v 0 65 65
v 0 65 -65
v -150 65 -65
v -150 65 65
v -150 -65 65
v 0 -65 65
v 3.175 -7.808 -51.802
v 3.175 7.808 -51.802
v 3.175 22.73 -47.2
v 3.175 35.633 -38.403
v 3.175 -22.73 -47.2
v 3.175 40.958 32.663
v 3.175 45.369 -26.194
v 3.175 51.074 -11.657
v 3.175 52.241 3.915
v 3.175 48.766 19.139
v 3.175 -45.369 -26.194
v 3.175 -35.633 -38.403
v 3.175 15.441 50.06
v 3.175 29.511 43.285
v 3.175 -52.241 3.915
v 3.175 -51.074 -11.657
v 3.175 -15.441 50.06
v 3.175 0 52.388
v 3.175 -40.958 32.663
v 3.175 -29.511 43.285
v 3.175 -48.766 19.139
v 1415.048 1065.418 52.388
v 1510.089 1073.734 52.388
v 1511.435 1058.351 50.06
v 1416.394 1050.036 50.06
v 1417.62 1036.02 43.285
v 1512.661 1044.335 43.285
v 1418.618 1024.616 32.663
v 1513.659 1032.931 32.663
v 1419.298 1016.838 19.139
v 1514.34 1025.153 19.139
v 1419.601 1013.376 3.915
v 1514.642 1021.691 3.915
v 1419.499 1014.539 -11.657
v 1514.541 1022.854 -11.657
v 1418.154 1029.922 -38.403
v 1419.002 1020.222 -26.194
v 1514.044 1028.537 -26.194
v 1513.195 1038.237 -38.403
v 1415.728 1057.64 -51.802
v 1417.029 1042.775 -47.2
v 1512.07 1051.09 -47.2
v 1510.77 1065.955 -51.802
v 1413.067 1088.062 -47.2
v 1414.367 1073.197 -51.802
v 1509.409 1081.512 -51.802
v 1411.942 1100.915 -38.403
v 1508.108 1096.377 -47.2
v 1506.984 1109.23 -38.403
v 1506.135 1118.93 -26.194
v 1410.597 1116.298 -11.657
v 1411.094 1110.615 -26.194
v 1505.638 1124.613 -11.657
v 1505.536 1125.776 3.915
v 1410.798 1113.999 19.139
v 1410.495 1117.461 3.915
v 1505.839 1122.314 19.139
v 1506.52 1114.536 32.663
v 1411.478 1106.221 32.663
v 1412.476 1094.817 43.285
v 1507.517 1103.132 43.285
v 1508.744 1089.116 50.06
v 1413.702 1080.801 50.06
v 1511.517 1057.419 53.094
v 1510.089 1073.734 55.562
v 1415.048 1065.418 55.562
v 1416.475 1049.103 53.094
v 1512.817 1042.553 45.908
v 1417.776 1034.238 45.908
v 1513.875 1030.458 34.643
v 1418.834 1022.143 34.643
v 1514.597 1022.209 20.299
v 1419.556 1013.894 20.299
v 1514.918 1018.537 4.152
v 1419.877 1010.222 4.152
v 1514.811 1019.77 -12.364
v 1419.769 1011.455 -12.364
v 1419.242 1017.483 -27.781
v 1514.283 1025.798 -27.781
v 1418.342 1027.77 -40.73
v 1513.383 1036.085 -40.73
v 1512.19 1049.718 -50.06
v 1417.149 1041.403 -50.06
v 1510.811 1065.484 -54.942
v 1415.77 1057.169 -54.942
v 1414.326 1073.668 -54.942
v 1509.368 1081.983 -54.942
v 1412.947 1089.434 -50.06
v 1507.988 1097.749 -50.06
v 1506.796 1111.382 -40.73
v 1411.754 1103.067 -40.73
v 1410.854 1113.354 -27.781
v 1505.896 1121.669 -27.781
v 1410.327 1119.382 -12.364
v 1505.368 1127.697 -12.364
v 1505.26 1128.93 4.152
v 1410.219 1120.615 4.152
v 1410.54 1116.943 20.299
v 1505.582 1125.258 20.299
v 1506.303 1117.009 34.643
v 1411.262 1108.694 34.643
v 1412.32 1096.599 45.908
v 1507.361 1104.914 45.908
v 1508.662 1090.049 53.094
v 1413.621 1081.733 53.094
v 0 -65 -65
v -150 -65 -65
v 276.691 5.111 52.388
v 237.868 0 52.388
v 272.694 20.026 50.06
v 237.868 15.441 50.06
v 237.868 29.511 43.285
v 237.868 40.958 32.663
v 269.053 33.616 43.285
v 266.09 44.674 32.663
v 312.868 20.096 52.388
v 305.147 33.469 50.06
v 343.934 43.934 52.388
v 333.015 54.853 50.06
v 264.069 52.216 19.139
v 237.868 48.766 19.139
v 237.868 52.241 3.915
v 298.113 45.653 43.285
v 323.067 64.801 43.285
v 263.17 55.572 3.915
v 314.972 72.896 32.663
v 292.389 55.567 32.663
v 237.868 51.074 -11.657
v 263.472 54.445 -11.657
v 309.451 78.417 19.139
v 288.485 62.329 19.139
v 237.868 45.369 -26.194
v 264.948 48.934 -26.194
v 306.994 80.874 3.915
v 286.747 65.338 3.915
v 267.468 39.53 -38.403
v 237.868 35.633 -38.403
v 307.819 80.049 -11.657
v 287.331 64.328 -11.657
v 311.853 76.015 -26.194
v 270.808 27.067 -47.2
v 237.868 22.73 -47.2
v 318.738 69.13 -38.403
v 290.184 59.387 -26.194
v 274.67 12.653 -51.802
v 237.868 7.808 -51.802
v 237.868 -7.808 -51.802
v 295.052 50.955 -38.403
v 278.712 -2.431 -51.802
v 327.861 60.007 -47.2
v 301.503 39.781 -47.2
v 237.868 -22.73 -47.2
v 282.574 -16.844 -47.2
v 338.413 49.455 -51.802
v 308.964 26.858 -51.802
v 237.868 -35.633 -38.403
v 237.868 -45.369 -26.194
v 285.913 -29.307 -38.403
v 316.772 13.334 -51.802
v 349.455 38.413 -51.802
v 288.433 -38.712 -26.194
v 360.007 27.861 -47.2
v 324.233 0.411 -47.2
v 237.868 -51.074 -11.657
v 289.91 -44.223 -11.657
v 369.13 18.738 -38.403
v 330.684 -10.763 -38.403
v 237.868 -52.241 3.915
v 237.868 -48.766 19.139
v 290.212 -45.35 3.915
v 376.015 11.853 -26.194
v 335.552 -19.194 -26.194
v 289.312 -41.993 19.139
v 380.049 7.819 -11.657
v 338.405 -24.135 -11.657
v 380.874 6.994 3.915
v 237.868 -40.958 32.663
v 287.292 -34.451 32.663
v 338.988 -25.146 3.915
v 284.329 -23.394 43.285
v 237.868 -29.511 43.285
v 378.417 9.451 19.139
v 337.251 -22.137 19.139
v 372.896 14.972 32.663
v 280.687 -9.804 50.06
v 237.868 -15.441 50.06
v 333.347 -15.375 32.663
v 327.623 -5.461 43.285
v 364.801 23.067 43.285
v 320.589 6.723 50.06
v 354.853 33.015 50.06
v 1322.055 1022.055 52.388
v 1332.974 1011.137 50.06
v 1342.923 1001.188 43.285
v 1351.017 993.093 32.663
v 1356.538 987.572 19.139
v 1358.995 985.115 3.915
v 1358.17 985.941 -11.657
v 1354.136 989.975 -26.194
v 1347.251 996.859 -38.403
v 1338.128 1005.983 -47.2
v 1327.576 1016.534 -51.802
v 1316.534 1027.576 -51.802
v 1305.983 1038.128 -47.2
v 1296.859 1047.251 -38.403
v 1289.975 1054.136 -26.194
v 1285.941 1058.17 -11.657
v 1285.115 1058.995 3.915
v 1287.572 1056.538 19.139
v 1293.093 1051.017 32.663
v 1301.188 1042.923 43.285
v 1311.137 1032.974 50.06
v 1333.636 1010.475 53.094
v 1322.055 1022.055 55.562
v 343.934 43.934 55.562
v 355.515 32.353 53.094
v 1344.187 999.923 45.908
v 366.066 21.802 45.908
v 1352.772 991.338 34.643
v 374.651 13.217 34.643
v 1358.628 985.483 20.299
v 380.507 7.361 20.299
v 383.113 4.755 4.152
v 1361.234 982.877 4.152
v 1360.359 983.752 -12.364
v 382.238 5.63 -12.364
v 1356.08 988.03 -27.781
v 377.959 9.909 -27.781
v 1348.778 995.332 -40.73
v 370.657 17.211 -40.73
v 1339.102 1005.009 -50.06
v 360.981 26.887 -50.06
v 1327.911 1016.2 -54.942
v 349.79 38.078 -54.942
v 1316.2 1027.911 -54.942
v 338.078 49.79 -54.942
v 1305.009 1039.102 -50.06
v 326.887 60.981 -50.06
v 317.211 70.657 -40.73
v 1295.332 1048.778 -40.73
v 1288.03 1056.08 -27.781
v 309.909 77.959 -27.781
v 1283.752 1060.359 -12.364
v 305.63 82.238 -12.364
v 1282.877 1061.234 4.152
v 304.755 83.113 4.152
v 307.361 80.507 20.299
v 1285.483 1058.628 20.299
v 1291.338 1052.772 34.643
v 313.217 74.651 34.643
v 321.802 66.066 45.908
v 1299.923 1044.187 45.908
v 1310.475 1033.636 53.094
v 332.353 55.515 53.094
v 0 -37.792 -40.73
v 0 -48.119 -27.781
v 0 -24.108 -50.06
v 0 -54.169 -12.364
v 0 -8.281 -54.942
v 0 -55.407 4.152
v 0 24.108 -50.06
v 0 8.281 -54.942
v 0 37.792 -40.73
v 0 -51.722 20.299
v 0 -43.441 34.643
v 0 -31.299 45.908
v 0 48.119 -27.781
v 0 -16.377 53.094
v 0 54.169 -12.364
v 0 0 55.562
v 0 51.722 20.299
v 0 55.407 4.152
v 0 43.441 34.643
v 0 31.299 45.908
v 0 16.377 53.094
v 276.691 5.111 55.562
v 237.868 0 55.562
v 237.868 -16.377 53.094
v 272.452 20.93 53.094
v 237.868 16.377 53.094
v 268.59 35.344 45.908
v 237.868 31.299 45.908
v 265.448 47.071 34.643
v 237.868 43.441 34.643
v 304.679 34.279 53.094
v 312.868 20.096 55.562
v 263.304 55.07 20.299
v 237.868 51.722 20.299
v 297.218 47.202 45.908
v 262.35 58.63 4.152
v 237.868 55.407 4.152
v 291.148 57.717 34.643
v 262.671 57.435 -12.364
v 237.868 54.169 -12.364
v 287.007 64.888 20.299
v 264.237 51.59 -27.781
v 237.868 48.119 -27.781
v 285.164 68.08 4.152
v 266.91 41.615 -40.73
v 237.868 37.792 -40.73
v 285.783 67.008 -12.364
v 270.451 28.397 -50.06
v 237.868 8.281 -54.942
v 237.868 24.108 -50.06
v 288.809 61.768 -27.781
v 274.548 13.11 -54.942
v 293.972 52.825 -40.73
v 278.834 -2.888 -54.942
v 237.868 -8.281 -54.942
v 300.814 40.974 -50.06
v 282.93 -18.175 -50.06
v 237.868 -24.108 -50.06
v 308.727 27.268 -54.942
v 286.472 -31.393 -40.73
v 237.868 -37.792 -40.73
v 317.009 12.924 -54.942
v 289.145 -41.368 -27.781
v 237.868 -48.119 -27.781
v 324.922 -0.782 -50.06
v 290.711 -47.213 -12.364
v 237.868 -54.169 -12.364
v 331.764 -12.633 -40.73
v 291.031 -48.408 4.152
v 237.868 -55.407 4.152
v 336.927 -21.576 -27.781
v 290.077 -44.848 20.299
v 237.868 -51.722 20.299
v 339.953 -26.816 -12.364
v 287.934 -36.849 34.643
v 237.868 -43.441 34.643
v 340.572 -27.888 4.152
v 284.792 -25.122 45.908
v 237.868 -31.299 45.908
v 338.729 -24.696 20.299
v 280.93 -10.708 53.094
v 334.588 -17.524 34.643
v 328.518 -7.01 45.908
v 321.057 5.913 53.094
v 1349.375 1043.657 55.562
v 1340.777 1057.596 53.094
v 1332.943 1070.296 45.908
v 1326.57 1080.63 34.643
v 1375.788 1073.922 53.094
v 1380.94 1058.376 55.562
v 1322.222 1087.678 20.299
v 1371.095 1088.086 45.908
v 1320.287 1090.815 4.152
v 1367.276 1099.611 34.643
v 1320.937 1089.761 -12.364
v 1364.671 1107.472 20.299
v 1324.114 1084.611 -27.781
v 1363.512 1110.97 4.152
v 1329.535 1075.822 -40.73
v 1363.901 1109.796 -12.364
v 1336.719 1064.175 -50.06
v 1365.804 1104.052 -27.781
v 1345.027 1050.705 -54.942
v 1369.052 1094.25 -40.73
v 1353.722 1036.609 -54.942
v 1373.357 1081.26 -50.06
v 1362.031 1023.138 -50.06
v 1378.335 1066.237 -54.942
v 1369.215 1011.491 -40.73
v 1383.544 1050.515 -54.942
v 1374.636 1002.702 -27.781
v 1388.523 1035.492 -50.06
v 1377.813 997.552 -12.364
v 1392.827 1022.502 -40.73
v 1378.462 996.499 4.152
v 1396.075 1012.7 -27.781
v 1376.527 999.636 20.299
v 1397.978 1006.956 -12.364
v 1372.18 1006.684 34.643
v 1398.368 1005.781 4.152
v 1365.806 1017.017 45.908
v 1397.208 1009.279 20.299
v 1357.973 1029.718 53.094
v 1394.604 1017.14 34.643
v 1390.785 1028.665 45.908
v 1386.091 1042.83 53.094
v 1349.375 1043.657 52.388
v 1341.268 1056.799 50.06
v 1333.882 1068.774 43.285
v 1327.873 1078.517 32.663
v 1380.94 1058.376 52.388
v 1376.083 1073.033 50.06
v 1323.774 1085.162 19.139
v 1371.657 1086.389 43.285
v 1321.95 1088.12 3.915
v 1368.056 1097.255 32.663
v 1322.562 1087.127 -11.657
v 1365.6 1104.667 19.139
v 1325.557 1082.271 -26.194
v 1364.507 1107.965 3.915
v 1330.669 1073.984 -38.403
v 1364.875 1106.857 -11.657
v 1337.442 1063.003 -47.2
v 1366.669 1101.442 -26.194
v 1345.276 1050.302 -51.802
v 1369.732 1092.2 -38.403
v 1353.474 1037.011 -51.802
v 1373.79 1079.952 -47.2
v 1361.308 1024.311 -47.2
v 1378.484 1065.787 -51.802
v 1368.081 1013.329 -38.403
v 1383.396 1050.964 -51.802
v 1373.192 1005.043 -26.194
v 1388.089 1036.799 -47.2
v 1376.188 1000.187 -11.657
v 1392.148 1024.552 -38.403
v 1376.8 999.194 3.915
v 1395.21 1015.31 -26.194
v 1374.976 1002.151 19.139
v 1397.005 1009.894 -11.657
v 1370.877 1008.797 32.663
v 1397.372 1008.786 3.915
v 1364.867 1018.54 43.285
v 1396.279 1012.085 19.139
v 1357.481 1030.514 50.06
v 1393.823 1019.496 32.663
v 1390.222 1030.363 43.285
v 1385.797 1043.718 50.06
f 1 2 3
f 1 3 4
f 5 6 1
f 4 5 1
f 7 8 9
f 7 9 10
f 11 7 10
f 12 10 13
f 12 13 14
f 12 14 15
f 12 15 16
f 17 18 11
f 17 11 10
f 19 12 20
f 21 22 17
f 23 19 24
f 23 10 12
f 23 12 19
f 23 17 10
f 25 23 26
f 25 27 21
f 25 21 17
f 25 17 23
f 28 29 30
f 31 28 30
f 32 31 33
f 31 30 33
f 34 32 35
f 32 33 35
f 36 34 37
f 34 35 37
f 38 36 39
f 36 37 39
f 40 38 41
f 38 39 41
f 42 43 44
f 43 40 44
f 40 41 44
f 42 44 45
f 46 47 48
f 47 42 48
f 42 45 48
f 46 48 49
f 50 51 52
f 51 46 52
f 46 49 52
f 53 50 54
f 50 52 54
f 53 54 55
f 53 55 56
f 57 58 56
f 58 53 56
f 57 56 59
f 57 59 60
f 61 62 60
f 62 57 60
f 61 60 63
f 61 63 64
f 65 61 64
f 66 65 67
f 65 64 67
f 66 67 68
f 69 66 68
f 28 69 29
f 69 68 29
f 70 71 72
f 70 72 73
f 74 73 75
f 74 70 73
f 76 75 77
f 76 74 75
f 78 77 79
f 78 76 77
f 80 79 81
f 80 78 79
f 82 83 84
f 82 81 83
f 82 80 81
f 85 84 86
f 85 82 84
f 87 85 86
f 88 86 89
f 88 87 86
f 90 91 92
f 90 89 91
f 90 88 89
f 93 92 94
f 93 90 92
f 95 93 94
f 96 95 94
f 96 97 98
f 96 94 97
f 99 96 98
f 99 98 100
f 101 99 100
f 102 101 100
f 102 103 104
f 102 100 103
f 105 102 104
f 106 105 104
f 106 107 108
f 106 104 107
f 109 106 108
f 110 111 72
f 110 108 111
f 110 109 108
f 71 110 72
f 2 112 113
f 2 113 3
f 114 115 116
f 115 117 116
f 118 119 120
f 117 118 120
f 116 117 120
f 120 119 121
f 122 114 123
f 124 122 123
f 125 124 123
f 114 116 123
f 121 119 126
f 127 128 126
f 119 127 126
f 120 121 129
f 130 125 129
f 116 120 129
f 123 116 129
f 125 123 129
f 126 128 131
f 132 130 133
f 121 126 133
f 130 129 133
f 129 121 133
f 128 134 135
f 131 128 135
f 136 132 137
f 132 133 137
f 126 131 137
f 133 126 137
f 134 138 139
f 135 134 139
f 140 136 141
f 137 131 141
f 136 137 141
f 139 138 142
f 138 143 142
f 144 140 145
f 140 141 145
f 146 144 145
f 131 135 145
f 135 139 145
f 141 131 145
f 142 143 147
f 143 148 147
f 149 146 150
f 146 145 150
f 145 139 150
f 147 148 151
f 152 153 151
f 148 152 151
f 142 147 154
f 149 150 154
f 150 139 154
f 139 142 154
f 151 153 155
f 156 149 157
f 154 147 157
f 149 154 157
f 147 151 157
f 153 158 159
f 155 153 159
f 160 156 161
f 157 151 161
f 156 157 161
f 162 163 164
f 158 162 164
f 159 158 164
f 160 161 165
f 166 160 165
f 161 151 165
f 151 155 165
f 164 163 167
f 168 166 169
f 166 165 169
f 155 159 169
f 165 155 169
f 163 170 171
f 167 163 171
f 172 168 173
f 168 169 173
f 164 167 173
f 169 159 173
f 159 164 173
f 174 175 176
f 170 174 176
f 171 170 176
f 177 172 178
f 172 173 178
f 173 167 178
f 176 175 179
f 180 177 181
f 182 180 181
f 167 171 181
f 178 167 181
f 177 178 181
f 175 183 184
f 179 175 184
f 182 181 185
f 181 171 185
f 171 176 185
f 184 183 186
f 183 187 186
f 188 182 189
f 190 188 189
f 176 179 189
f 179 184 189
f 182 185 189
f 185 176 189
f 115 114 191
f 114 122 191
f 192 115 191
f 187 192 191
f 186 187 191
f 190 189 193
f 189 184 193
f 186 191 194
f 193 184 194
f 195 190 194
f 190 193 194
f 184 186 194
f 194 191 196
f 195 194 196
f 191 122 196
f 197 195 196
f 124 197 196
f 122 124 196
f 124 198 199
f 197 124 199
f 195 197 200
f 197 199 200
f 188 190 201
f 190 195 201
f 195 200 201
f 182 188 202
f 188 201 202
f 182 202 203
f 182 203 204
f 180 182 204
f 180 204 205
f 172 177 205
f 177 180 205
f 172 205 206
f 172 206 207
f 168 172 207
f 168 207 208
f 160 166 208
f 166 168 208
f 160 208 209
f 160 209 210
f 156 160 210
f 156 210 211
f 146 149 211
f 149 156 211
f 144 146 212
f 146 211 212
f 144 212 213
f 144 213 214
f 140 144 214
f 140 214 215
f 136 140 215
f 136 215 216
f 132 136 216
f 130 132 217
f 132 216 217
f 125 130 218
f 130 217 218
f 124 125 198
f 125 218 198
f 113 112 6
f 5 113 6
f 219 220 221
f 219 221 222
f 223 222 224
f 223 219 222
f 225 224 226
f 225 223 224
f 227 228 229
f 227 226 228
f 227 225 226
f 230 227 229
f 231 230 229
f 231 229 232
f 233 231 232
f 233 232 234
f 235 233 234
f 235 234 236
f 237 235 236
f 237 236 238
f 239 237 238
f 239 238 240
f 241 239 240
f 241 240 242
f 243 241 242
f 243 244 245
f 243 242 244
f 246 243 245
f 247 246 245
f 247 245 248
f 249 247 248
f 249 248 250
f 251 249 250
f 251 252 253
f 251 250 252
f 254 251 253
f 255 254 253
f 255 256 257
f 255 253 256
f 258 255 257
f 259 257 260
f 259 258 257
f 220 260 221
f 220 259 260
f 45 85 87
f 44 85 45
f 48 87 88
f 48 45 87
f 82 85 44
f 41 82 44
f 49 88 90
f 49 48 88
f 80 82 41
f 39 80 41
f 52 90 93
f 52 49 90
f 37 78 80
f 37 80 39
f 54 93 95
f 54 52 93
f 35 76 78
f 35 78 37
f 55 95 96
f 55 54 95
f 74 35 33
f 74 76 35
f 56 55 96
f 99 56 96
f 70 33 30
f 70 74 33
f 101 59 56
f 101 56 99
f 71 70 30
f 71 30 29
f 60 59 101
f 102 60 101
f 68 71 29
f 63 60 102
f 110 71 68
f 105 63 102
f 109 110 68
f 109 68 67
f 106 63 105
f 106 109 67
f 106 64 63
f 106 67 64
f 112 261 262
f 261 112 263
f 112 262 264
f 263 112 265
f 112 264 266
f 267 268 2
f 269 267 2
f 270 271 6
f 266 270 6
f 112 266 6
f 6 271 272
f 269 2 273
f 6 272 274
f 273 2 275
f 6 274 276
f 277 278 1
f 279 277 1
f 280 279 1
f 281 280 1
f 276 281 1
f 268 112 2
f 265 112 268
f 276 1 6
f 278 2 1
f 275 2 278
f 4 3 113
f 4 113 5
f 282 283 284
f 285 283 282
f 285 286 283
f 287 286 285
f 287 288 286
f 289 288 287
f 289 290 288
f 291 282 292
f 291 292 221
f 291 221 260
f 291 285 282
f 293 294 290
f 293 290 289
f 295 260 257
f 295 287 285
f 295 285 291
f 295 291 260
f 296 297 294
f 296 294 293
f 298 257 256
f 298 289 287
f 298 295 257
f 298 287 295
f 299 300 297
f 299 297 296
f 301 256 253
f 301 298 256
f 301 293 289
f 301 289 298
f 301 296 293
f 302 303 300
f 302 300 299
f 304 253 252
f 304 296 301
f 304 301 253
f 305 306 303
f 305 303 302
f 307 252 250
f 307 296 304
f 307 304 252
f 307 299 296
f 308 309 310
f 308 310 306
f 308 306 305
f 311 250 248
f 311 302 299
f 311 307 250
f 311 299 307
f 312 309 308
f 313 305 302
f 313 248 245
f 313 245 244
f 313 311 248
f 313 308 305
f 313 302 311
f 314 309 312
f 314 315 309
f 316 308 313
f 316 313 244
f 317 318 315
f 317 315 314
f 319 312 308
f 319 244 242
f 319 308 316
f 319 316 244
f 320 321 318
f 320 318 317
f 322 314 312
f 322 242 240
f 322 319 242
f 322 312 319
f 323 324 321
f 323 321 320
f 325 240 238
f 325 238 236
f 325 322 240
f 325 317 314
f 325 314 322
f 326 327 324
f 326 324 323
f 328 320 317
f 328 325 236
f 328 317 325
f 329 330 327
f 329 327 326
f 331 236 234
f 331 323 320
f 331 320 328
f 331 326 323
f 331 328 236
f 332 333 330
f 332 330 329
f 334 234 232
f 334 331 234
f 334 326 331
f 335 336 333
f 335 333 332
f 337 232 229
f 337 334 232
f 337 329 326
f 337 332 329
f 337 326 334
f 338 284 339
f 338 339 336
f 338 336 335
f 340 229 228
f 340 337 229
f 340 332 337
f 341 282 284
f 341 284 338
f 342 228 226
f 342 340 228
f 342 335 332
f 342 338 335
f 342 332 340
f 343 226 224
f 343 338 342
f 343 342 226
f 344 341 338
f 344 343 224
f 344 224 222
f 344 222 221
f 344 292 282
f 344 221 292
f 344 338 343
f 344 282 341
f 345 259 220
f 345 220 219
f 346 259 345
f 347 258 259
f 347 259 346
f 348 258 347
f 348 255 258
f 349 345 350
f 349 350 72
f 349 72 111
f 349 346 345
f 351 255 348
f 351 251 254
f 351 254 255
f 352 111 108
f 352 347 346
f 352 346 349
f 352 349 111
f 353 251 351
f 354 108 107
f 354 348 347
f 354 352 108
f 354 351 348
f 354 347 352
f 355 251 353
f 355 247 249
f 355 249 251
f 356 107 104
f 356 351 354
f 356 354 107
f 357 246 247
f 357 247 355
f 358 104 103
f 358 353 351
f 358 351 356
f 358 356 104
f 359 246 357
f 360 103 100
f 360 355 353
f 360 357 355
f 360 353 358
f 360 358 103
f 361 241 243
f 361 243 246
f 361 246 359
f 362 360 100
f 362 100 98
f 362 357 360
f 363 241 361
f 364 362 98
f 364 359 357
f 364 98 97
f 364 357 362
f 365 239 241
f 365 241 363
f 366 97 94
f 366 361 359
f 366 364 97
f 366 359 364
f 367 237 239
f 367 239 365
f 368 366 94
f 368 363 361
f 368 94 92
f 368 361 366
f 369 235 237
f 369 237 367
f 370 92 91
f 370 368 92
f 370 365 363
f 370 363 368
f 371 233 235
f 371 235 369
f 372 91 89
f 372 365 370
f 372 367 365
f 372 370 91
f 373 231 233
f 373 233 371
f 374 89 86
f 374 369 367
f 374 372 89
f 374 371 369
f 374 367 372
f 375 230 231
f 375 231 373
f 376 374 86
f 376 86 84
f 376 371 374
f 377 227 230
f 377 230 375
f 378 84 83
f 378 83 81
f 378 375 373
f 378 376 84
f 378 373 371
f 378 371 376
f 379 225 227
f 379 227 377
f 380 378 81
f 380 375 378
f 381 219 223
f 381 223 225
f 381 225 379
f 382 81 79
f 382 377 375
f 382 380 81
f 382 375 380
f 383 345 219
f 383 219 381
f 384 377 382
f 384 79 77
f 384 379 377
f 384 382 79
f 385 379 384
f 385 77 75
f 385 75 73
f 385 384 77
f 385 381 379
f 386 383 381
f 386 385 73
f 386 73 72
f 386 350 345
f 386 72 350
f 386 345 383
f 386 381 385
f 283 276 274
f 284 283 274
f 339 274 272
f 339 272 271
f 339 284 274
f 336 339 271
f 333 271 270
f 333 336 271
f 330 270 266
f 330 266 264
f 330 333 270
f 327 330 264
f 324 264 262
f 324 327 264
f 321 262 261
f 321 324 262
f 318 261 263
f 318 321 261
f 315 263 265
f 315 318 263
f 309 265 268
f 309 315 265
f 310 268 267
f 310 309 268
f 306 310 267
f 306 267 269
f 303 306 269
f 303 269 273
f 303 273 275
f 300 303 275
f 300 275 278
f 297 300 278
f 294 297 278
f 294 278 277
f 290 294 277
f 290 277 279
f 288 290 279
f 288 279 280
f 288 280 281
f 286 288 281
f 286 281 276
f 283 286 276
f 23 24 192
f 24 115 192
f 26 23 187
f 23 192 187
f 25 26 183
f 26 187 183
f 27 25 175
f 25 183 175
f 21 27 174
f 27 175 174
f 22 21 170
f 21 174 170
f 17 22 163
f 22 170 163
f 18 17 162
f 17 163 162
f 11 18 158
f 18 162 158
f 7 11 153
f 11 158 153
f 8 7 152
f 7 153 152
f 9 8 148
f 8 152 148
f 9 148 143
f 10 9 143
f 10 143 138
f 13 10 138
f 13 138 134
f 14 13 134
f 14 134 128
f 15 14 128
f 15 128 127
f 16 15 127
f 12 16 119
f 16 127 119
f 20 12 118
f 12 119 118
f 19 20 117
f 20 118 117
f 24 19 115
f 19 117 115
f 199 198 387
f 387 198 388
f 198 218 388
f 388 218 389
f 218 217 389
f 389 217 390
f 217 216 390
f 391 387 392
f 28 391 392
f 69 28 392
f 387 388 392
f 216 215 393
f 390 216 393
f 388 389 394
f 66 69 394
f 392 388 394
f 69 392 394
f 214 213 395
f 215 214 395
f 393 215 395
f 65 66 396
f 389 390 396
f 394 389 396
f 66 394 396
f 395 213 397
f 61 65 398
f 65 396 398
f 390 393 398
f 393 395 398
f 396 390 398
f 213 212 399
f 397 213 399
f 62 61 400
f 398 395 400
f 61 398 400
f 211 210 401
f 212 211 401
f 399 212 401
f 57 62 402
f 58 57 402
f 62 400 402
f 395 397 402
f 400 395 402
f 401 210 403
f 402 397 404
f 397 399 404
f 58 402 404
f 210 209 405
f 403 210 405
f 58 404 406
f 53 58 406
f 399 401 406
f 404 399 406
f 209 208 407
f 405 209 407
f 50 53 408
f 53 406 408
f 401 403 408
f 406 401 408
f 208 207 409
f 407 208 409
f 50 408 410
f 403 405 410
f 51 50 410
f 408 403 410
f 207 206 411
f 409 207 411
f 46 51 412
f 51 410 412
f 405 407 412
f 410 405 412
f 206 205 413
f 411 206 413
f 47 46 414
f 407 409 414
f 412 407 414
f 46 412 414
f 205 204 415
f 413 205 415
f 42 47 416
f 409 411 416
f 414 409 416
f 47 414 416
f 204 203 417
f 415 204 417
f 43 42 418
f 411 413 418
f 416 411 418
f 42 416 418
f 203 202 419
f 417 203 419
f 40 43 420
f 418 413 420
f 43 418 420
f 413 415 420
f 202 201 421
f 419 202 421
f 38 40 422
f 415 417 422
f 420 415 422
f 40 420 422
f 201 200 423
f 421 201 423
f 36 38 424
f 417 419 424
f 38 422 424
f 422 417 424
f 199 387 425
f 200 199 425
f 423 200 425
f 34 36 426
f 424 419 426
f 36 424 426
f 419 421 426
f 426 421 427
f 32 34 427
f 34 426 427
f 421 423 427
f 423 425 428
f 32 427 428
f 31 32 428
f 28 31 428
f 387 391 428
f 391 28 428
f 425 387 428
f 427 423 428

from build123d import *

# Parameters (mm, degrees)
BARRER2_PROFILE_R       = 55.5625
VACIADO1_T              = -3.175
CROQUIS2_W              = 130
CROQUIS2_H              = 130
SALIENTE_EXTRUIR1_DEPTH = 150


with BuildPart() as part:
    # Barrer2: sweep along a path in Croquis1
    with BuildLine(Plane.XY) as barrer2_path:
        Line((0, 0), (237.867965644, 0))
        ThreePointArc((237.867965644, 0), (295.270480499, 11.418070123), (343.933982822, 43.933982822))
        Line((343.933982822, 43.933982822), (1322.05529866, 1022.05529866))
        ThreePointArc((1322.05529866, 1022.05529866), (1364.728576577, 1051.935449537), (1415.047954426, 1065.418486196))
        Line((1415.047954426, 1065.418486196), (1510.089376494, 1073.733533192))
    # Barrer2 profile (on start of the path) → Barrer2 (sweep)
    with BuildSketch(Plane(origin=(0, 0, 0), x_dir=(0, 0, 1), z_dir=(1, 0, 0))):
        Circle(BARRER2_PROFILE_R)
    sweep(path=barrer2_path.line)

    # Vaciado1
    vaciado1_openings = [part.faces().sort_by_distance(p)[0] for p in [
        (1510.089376494, 1073.733533192, 0),
    ]]
    offset(amount=VACIADO1_T, openings=vaciado1_openings, kind=Kind.INTERSECTION)

    # Croquis2 → Saliente-Extruir1 (add)
    with BuildSketch(Plane.ZY):
        Rectangle(CROQUIS2_W, CROQUIS2_H)
    extrude(amount=SALIENTE_EXTRUIR1_DEPTH)


solid = part.part
